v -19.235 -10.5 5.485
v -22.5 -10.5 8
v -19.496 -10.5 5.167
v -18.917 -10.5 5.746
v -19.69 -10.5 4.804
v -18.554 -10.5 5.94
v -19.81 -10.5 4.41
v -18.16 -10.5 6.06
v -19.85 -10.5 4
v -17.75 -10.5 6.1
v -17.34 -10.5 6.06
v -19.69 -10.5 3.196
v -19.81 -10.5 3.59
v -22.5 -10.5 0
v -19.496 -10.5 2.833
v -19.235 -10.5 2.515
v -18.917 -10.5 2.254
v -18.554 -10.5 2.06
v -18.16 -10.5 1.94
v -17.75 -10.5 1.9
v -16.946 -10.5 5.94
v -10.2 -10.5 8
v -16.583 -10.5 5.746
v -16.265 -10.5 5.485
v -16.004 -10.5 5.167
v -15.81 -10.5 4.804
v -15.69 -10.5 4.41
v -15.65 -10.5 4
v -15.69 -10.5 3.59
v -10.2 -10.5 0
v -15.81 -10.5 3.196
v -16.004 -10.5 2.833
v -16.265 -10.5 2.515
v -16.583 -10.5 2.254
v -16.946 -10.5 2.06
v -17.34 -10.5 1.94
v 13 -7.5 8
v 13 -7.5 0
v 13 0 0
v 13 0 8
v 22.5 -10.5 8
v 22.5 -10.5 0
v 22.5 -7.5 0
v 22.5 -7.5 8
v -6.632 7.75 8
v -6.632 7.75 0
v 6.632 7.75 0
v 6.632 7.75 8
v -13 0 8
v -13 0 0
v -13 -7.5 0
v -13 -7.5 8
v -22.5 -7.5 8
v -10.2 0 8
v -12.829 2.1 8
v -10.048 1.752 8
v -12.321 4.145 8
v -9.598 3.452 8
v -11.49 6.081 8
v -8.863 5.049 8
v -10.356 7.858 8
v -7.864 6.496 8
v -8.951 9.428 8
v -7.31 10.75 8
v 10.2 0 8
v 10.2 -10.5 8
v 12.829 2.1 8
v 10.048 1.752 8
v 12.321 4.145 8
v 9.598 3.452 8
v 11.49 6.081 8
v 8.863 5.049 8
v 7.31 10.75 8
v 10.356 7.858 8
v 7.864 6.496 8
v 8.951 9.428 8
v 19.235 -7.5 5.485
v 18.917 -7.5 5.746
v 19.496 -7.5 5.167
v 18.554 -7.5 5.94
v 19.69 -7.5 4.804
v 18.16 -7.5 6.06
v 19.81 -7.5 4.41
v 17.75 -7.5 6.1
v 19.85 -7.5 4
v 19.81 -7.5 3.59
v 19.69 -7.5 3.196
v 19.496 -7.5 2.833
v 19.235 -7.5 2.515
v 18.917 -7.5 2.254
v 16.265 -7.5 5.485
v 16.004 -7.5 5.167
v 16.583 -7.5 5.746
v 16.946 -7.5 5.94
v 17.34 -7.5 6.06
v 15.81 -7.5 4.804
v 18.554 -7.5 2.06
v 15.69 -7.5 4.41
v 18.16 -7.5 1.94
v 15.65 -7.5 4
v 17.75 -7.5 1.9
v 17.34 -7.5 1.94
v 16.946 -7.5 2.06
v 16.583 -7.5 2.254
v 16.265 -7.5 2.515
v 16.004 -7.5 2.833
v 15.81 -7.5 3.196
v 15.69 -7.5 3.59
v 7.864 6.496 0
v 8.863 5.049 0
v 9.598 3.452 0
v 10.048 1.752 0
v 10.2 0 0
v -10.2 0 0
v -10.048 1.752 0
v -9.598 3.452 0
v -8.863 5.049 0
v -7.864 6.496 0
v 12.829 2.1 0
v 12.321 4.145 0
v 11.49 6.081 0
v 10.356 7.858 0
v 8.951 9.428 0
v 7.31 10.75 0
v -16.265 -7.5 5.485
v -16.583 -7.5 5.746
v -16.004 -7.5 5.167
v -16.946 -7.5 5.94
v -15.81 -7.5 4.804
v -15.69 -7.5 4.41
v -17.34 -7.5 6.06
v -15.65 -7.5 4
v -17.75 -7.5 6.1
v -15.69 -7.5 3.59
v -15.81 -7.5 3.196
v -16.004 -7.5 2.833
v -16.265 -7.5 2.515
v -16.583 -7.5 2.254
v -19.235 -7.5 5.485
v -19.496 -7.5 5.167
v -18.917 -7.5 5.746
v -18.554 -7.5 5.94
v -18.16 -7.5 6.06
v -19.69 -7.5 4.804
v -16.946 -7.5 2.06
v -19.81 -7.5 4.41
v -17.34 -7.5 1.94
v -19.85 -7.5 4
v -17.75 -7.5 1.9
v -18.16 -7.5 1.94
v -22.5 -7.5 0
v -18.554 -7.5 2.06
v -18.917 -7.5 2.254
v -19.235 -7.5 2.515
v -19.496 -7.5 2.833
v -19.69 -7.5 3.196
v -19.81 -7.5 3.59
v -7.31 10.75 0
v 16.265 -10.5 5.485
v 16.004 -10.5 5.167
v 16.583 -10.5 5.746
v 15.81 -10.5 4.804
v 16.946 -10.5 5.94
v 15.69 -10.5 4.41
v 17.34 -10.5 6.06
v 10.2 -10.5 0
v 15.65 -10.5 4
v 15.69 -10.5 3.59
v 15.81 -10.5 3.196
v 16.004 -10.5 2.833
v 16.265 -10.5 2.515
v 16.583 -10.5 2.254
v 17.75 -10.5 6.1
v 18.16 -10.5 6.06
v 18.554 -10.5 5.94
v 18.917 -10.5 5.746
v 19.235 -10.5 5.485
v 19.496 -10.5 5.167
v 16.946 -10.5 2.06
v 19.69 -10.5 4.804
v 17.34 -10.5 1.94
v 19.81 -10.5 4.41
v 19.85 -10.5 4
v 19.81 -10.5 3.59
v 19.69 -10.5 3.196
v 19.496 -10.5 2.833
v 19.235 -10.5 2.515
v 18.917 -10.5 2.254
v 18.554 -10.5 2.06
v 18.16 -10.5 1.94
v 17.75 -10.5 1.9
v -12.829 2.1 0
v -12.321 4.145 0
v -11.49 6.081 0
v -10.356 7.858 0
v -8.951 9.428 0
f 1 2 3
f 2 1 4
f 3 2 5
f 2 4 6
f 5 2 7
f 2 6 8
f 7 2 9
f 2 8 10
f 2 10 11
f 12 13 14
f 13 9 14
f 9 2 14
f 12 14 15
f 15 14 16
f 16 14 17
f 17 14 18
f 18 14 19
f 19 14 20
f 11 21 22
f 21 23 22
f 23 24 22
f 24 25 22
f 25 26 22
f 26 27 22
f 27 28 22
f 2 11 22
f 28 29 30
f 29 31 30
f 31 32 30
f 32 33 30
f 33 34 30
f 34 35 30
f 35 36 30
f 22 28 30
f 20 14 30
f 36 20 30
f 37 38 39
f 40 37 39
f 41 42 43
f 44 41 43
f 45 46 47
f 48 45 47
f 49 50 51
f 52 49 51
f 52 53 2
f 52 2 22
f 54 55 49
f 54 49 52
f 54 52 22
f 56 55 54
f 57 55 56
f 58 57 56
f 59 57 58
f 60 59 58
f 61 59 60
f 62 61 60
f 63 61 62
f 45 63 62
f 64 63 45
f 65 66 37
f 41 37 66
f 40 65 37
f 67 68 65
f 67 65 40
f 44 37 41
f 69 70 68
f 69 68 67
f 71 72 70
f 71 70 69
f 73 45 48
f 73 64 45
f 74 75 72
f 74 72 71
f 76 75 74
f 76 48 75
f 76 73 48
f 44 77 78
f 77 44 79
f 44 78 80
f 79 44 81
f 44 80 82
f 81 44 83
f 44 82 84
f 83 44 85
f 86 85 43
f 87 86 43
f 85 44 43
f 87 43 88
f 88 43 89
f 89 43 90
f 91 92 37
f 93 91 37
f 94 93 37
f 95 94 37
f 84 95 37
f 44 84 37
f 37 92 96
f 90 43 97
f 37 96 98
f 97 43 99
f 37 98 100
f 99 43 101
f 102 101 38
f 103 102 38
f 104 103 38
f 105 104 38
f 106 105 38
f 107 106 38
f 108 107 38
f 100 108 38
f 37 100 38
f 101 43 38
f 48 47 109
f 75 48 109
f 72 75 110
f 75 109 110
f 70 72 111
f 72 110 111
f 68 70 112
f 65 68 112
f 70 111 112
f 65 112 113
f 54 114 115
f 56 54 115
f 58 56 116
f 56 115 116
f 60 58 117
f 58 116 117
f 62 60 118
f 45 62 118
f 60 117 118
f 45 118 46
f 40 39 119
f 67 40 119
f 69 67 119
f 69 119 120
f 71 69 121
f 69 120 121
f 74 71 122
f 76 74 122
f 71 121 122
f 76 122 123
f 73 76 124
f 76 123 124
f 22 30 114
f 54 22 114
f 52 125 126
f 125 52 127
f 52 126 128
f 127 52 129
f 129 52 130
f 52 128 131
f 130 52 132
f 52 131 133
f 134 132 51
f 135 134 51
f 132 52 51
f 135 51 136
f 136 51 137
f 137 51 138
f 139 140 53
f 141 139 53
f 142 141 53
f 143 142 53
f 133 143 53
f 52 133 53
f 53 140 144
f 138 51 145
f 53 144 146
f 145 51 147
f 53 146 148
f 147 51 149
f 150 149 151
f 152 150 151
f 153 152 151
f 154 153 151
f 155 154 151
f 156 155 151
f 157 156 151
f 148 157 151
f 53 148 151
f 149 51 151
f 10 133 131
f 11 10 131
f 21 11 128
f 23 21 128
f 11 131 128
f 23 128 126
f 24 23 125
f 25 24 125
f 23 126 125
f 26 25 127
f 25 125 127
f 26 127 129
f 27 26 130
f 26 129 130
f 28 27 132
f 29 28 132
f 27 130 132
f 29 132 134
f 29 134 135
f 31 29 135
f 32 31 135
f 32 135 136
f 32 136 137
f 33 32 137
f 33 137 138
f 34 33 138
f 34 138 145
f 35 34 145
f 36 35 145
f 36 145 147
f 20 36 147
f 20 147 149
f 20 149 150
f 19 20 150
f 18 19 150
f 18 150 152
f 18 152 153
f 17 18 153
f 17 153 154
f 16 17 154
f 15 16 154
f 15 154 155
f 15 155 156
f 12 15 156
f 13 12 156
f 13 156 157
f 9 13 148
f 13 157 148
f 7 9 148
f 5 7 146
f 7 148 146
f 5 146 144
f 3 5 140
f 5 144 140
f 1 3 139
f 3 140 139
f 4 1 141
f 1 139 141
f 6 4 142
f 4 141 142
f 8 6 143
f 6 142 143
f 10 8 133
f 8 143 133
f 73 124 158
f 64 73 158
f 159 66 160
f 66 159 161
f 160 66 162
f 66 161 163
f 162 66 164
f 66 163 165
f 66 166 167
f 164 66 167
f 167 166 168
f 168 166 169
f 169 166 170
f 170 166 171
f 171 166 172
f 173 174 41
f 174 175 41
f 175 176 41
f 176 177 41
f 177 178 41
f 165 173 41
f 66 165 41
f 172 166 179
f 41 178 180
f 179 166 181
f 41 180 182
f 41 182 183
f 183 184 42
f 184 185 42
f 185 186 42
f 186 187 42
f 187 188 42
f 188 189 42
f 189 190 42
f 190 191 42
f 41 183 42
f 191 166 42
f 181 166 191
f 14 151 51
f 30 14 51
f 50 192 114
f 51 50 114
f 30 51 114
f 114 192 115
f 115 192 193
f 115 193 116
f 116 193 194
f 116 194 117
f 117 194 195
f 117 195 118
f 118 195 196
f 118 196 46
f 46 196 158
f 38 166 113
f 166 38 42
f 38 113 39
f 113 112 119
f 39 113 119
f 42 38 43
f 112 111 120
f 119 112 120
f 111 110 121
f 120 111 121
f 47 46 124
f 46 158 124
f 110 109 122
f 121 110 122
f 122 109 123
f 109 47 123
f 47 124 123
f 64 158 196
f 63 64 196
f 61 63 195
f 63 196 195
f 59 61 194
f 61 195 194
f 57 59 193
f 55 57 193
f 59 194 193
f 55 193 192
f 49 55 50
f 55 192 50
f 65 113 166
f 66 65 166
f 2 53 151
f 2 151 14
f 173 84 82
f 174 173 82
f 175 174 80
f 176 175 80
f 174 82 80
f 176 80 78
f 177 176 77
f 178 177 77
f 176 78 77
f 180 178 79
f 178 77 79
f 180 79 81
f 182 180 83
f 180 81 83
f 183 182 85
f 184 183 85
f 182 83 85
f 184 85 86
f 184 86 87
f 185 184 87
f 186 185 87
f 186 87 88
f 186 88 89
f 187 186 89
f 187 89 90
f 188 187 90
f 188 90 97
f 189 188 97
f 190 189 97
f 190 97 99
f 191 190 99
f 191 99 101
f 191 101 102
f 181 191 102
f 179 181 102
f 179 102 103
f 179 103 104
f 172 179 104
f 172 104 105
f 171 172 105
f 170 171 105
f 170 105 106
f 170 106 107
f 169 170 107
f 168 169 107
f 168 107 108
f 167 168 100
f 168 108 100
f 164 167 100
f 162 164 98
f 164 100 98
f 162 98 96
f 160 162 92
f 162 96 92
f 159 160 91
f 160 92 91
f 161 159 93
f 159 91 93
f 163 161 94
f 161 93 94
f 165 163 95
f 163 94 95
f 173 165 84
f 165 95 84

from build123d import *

# Parameters (mm, degrees)
CLAMP_DEPTH      = 8
SKETCH2_R        = 2.1
SCREW_HOLE_DEPTH = 31.055157627


with BuildPart() as part:
    # Sketch1 → Clamp (new body)
    with BuildSketch(Plane.XY):
        with BuildLine():
            Line((-6.631553363, 7.75), (6.631553363, 7.75))
            ThreePointArc((6.631553363, 7.75), (9.265037623, 4.266037723), (10.2, 0))
            Line((10.2, 0), (10.2, -10.5))
            Line((10.2, -10.5), (22.5, -10.5))
            Line((22.5, -10.5), (22.5, -7.5))
            Line((22.5, -7.5), (13, -7.5))
            Line((13, -7.5), (13, 0))
            ThreePointArc((13, 0), (11.489805152, 6.081478239), (7.310095759, 10.75))
            Line((7.310095759, 10.75), (-7.310095759, 10.75))
            ThreePointArc((-7.310095759, 10.75), (-11.489805152, 6.081478239), (-13, 0))
            Line((-13, 0), (-13, -7.5))
            Line((-13, -7.5), (-22.5, -7.5))
            Line((-22.5, -7.5), (-22.5, -10.5))
            Line((-22.5, -10.5), (-10.2, -10.5))
            Line((-10.2, -10.5), (-10.2, 0))
            ThreePointArc((-10.2, 0), (-9.265037623, 4.266037723), (-6.631553363, 7.75))
        make_face()
    extrude(amount=CLAMP_DEPTH)

    # Sketch2 → Screw Hole (cut, through all)
    with BuildSketch(Plane(origin=(0, -7.5, 0), x_dir=(1, 0, 0), z_dir=(0, 1, 0))):
        with Locations(Location((-17.75, -4, 0), (0, 0, 270))):
            Circle(SKETCH2_R)
        with Locations(Location((17.75, -4, 0), (0, 0, 270))):
            Circle(SKETCH2_R)
    extrude(amount=-SCREW_HOLE_DEPTH, mode=Mode.SUBTRACT)


solid = part.part
